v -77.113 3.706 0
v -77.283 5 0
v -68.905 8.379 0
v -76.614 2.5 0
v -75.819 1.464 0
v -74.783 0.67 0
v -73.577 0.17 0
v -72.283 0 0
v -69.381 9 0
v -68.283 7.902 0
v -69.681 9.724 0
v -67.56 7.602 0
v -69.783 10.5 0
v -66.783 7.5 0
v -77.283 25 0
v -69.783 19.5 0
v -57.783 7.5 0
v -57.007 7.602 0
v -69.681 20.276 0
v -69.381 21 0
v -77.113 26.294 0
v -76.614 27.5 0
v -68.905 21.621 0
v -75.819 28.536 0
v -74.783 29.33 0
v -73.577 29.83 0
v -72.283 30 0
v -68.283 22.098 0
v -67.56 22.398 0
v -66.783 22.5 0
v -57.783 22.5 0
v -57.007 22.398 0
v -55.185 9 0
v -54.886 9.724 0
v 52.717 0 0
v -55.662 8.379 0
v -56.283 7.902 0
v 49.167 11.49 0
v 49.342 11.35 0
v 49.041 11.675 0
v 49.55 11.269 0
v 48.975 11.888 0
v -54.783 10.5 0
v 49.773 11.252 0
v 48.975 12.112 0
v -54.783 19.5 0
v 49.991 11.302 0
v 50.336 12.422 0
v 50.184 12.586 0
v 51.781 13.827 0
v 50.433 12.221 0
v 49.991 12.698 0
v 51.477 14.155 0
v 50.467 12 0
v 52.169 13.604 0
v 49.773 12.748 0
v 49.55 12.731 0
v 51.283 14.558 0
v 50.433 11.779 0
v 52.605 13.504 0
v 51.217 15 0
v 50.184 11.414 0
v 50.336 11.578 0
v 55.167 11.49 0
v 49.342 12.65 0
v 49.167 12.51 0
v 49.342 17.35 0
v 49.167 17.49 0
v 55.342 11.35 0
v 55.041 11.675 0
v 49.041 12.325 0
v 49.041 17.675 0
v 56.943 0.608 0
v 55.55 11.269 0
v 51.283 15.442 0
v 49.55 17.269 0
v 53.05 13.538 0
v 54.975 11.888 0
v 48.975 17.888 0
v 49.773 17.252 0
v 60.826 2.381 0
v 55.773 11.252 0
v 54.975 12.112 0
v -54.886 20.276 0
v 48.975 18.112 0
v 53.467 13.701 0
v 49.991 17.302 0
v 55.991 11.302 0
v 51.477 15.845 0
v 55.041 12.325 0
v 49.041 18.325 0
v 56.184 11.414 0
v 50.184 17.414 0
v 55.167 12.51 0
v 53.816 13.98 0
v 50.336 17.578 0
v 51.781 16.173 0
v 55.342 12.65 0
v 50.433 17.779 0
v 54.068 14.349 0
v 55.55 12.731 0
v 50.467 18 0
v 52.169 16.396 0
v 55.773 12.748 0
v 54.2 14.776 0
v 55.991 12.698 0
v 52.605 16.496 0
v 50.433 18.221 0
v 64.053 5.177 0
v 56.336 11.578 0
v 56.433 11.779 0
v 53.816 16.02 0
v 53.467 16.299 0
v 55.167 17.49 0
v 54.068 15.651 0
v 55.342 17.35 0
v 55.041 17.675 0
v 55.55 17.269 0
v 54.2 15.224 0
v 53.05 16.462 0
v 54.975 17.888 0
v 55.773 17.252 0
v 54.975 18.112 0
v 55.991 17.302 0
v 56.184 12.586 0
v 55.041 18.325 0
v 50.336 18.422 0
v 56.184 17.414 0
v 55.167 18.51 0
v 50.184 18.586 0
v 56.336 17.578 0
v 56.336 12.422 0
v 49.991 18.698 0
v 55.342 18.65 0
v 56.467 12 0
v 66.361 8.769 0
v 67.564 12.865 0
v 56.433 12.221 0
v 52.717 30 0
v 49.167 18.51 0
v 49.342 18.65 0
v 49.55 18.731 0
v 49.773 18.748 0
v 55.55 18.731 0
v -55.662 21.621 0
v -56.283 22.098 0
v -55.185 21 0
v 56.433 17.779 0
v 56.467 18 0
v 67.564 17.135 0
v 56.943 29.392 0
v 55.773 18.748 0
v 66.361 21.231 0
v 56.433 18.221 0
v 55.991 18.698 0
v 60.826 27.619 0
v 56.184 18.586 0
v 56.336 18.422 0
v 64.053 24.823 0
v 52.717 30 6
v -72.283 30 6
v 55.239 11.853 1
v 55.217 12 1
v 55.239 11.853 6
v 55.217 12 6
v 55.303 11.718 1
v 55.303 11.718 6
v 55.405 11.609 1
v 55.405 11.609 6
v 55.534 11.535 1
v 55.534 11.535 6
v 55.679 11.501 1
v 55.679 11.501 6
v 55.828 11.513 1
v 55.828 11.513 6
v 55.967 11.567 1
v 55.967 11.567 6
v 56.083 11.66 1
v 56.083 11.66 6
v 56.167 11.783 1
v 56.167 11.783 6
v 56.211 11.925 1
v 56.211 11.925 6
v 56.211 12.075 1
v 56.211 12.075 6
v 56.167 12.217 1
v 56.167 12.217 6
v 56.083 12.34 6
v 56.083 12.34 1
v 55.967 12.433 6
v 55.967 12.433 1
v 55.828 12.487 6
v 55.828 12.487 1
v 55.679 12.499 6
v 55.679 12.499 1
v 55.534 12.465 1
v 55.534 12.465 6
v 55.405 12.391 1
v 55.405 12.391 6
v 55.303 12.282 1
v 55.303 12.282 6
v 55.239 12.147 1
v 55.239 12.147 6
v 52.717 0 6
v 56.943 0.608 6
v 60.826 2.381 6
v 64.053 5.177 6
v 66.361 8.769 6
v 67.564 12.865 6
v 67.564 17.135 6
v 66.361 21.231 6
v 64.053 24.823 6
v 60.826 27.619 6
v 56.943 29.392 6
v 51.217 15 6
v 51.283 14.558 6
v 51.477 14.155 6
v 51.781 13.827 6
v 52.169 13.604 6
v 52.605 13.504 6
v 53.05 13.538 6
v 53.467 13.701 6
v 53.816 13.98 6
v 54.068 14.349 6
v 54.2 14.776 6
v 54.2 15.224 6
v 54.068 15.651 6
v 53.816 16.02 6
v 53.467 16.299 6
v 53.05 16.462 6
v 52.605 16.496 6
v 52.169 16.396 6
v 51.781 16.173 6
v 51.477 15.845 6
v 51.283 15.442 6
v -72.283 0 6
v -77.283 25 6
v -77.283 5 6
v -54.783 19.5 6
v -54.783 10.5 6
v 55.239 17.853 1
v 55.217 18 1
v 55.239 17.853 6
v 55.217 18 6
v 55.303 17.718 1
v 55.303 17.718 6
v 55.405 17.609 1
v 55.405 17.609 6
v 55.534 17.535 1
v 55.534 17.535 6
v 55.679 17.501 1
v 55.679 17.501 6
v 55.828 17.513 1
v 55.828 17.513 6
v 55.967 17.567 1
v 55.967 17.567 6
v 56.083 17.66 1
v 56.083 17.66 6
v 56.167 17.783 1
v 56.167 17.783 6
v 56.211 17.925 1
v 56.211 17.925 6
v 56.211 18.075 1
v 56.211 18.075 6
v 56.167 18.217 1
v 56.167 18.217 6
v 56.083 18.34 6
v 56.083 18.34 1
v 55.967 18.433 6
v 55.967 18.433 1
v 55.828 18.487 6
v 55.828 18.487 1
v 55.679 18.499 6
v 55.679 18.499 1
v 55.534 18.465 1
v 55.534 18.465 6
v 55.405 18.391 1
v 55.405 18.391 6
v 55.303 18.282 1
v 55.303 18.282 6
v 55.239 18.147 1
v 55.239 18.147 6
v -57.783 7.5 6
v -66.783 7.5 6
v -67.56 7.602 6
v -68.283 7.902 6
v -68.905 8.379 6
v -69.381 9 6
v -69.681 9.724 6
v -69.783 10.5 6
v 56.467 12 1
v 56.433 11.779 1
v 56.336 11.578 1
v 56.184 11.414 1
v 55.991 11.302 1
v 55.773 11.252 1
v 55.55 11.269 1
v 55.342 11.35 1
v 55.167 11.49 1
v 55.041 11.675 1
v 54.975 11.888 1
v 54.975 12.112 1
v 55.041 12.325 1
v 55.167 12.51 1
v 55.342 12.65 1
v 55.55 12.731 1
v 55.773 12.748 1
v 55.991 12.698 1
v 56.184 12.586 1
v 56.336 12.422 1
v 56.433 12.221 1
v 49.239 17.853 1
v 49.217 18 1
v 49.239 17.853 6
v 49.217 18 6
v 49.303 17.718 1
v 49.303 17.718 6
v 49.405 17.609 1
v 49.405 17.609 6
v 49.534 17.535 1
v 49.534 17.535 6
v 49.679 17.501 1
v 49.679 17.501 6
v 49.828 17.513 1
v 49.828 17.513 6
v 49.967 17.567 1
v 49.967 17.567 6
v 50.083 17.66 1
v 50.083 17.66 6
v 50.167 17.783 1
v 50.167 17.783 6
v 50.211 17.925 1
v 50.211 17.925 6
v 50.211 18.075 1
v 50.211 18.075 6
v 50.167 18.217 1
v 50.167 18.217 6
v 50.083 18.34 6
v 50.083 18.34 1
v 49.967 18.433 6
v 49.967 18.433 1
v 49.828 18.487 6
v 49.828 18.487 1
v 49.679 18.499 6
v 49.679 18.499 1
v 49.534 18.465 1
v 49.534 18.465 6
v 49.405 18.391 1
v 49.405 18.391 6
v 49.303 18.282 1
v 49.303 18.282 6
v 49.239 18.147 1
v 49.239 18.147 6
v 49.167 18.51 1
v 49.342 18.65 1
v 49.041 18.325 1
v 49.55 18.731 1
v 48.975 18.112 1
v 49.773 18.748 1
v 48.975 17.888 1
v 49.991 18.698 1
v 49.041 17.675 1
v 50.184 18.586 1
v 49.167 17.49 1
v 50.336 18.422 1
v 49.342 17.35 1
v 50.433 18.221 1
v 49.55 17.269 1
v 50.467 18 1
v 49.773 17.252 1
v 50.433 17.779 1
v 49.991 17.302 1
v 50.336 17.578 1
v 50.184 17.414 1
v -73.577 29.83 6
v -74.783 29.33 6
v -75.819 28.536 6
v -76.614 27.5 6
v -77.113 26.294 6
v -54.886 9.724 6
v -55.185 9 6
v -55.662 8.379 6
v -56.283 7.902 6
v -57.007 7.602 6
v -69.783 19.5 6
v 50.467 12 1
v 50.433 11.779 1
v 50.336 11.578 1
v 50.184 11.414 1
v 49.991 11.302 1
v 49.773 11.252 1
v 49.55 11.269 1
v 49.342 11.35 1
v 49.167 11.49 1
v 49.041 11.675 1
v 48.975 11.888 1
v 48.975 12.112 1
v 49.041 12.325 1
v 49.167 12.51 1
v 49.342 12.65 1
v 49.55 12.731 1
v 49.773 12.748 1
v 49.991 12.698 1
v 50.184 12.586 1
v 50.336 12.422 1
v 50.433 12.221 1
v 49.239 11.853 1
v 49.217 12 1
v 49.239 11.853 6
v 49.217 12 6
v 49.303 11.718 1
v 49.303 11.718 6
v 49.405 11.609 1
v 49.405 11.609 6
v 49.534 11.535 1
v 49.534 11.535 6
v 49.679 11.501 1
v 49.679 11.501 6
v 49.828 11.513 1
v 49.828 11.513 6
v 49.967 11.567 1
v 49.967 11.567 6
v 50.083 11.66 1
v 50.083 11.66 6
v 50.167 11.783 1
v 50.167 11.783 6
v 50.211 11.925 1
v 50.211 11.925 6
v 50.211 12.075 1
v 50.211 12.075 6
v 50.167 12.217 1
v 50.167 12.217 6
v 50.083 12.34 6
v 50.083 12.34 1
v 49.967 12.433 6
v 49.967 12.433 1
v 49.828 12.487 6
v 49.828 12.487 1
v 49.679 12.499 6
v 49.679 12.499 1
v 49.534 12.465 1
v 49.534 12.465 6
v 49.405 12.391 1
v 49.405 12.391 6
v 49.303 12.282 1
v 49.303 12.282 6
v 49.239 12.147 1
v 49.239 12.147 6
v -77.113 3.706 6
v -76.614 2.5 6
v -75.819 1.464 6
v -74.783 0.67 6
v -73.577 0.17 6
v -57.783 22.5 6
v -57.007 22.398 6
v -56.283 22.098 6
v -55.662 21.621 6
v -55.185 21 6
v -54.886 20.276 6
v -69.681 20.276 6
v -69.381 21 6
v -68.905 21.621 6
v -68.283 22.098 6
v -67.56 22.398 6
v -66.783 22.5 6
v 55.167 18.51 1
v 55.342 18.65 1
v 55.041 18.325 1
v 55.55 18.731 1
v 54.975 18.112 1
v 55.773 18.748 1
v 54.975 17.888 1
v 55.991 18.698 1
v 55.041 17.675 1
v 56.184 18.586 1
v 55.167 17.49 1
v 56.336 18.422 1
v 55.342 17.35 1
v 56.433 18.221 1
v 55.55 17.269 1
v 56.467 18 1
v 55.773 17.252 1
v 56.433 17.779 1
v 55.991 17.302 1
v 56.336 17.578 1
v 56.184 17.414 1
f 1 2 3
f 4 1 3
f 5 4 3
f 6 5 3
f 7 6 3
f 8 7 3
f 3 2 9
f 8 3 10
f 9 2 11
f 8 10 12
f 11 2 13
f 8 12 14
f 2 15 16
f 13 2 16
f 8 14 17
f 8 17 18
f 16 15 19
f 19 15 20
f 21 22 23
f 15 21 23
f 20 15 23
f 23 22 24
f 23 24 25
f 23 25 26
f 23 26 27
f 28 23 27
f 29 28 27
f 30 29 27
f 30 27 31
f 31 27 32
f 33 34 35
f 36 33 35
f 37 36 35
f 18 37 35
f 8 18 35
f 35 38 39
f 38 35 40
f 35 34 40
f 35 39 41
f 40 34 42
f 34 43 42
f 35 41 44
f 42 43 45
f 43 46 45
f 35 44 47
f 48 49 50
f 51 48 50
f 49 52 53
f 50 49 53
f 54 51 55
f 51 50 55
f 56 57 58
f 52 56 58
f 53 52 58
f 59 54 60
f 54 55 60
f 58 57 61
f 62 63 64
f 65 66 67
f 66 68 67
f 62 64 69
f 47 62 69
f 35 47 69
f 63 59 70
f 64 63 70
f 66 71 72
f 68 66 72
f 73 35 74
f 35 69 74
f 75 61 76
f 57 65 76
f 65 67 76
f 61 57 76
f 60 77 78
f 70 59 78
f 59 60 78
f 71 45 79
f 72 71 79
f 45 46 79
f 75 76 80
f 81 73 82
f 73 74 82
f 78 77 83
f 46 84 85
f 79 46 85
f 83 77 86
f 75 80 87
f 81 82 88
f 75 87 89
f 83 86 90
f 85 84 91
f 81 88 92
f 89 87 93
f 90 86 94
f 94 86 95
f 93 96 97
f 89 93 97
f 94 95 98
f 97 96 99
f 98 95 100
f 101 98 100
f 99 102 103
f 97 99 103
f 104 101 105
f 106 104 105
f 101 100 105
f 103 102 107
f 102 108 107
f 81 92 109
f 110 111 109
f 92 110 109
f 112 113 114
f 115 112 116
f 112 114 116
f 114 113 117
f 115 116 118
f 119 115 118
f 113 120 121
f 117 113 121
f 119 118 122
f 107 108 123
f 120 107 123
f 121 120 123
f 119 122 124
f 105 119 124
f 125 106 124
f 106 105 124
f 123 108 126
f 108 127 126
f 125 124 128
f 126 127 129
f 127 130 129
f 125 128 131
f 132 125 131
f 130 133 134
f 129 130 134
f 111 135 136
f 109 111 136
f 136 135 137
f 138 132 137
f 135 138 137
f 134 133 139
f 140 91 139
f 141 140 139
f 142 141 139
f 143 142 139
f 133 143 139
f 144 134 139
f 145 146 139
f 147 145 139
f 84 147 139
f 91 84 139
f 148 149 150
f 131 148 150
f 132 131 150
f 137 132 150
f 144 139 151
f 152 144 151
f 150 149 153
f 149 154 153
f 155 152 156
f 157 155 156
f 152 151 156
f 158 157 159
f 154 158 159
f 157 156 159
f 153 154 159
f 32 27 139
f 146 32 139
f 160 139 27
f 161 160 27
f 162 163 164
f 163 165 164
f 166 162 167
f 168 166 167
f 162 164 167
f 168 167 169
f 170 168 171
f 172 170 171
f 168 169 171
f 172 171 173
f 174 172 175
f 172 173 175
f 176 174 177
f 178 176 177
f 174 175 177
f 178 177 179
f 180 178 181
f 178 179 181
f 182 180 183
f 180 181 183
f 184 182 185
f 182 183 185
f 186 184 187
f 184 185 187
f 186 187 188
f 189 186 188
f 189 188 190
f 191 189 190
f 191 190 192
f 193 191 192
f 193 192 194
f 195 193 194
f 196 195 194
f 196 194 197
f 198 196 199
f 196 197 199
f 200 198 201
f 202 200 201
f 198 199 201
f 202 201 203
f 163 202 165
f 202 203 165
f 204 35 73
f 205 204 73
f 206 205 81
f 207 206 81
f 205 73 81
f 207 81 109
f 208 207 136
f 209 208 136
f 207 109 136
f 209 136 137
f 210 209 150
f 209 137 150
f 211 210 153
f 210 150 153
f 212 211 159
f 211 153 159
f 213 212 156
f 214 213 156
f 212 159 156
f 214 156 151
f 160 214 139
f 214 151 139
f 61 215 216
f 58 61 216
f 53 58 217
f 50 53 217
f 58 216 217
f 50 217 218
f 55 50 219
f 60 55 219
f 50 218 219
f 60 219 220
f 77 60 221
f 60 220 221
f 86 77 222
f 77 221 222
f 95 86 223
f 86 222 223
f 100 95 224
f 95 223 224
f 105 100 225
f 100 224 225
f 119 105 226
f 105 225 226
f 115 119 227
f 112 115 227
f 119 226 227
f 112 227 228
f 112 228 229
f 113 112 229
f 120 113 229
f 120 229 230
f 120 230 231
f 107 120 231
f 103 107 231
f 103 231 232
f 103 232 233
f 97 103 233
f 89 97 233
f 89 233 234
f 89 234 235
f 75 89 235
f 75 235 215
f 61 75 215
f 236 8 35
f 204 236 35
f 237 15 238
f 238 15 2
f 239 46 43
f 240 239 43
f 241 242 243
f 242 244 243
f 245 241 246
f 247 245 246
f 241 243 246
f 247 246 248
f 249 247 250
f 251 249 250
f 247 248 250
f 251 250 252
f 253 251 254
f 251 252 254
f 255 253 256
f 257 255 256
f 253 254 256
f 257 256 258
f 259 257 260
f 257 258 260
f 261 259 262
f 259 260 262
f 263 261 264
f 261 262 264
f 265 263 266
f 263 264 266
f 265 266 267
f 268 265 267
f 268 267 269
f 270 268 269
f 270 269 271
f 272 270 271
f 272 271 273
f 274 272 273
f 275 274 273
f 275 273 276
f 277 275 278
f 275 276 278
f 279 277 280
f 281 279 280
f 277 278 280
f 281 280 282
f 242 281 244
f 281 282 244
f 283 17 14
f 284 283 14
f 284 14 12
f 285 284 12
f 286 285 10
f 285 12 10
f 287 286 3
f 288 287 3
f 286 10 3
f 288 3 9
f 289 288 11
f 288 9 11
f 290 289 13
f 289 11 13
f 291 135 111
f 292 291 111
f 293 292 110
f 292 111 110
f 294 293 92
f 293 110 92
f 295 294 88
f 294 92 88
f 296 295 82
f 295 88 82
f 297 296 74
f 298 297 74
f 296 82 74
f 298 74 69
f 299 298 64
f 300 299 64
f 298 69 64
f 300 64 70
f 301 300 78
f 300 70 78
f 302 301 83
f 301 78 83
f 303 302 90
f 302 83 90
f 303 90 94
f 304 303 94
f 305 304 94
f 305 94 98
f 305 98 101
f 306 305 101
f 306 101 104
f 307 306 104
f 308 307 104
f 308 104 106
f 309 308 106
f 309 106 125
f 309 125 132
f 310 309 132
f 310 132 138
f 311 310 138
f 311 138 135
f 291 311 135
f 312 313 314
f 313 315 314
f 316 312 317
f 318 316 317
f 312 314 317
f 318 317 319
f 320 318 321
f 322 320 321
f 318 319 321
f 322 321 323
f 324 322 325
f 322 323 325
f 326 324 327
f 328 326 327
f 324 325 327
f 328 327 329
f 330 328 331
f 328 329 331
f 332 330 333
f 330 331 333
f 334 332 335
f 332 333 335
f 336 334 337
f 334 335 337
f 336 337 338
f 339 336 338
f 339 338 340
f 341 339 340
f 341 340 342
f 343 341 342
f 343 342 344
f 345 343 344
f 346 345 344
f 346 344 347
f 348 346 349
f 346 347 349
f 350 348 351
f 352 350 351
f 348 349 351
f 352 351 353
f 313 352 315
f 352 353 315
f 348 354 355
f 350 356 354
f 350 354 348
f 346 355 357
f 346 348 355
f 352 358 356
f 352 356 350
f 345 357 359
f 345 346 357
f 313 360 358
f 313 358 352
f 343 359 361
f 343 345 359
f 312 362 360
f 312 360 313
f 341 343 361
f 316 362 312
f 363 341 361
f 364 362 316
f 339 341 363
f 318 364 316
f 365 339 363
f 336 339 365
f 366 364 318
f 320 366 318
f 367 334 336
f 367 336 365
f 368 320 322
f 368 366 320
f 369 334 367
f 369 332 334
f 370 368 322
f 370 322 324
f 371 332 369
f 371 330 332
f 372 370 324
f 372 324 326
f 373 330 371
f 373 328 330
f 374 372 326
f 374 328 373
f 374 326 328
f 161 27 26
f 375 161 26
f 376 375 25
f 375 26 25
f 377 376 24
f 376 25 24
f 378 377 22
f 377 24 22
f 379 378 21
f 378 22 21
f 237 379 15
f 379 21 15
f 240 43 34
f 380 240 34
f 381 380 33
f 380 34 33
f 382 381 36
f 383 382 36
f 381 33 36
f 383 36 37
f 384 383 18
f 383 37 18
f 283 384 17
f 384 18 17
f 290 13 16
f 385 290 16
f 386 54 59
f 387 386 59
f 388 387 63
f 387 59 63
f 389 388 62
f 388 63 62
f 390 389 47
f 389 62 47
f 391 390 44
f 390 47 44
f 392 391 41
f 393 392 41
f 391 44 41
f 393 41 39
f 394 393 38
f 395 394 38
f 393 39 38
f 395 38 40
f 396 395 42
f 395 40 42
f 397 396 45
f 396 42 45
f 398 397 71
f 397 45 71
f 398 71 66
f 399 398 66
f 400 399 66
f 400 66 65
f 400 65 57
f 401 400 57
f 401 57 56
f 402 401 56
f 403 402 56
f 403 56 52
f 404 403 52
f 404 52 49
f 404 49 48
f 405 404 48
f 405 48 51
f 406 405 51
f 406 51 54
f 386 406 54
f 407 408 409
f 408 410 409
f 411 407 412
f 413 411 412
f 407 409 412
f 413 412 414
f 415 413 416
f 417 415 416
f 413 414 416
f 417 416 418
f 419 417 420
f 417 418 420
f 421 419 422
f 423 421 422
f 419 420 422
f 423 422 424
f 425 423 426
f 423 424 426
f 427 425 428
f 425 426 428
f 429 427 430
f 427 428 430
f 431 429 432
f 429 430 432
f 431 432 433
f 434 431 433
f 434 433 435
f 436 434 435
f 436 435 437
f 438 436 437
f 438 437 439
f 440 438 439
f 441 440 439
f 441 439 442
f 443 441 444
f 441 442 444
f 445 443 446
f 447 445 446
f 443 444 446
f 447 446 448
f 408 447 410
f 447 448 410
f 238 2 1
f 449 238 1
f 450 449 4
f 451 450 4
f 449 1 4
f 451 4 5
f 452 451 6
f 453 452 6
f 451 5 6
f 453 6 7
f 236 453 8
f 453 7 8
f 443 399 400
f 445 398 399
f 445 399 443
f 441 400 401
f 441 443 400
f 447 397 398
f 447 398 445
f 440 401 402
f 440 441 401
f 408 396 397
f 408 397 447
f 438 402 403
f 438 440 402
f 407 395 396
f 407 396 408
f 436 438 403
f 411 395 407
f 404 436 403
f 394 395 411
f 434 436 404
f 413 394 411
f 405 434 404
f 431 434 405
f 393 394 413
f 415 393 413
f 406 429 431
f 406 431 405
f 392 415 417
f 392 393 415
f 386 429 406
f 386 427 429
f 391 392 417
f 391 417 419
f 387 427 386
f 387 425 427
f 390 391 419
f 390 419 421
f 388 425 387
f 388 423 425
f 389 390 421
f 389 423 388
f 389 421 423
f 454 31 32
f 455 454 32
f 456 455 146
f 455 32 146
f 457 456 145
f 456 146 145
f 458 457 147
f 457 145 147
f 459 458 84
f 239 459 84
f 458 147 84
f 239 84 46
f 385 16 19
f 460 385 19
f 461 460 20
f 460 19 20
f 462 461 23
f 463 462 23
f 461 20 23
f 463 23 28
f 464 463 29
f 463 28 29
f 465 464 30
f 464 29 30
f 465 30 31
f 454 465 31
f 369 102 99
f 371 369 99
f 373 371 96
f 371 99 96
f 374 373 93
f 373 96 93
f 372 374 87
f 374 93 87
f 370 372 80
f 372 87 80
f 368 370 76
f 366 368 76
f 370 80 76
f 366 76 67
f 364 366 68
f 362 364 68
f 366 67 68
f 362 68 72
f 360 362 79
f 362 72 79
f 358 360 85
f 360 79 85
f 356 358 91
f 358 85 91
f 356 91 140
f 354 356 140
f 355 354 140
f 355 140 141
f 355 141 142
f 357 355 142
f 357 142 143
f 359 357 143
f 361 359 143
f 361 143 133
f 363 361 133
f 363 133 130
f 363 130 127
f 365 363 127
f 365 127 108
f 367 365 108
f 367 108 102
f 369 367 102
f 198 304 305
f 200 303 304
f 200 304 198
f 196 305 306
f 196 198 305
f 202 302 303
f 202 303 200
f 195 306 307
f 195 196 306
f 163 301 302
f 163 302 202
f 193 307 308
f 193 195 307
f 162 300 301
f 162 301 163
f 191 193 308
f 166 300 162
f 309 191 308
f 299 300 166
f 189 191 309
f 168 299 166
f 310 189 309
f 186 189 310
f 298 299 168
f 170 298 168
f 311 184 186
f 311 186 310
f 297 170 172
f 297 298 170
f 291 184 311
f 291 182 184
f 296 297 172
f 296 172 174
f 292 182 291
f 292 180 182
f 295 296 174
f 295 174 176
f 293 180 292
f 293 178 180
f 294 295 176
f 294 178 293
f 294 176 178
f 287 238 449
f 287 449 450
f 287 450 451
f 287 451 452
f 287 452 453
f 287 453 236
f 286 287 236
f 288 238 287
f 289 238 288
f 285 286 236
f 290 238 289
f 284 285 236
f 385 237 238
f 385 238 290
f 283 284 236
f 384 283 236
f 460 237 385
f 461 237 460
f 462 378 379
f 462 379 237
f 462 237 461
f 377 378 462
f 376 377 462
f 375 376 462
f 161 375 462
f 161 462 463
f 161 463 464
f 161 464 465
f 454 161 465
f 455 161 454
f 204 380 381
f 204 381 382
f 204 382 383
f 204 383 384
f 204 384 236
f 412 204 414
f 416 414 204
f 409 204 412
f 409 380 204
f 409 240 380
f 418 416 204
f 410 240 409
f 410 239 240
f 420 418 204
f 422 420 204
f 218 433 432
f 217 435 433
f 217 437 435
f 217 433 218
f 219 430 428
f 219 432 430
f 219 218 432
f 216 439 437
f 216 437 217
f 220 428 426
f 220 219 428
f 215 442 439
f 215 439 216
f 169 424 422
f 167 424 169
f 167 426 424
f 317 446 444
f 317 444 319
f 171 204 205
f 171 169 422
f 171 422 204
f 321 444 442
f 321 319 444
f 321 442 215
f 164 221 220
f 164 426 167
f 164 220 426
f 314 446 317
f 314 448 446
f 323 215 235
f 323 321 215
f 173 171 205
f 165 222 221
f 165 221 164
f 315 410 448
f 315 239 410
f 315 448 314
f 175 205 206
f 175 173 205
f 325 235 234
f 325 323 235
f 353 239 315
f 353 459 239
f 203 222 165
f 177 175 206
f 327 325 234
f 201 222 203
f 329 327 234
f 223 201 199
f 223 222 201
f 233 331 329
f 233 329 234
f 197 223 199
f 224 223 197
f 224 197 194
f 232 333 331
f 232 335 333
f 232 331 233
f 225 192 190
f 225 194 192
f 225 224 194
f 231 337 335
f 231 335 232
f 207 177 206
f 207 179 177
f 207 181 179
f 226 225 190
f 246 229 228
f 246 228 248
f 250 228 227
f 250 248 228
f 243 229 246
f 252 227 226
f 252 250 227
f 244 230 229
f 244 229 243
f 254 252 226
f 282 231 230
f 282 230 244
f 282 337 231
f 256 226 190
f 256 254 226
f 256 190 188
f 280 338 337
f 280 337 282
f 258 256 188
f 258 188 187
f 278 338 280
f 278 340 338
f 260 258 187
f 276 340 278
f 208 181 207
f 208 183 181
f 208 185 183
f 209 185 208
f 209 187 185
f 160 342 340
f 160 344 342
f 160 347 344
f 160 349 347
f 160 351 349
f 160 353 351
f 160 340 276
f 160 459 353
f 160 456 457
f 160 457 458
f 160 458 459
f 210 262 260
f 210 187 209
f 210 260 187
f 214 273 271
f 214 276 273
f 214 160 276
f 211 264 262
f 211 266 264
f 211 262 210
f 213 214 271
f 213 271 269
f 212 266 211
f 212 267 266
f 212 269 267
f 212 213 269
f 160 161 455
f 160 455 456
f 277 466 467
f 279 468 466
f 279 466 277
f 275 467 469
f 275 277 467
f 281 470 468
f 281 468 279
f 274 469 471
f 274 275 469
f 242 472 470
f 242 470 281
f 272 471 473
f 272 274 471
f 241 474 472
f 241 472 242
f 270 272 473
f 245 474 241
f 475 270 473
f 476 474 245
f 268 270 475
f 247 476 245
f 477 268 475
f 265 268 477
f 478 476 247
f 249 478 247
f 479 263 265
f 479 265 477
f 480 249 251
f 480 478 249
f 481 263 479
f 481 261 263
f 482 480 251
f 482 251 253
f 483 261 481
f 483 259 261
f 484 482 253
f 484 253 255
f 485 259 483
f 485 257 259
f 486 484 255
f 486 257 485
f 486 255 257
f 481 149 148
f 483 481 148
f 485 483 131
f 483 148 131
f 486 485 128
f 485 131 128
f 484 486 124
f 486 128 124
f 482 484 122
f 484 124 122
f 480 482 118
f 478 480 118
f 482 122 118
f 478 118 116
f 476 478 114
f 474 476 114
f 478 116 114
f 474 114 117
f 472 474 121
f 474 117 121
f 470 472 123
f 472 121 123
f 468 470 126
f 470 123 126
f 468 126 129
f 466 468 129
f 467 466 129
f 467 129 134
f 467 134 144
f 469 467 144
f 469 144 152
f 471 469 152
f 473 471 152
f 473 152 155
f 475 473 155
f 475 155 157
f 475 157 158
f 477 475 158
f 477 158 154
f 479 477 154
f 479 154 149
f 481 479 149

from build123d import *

# Parameters (mm, degrees)
F1_DEPTH       = 6
F2_D           = 3
F3_D           = 1
F3_CBORE_D     = 1.5
F3_CBORE_DEPTH = 1


with BuildPart() as f1:
    # F0 (on Top) → F1 (new body)
    with BuildSketch(Plane.XY):
        with BuildLine():
            Line((52.7166165411, 30), (52.7166165411, 0))
            ThreePointArc((52.7166165411, 0), (67.7166165411, 15), (52.7166165411, 30))
        make_face()
        with BuildLine():
            Line((34.7231468186, 0), (52.7166165411, 0))
            ThreePointArc((52.7166165411, 0), (37.7166165411, 15), (52.7166165411, 30))
            Line((52.7166165411, 30), (35.3341475129, 30))
            Line((35.3341475129, 30), (-47.2833834589, 30))
            Line((-47.2833834589, 30), (-72.2833834589, 30))
            ThreePointArc((-72.2833834589, 30), (-75.8189173648, 28.5355339059), (-77.2833834589, 25))
            Line((-77.2833834589, 25), (-77.2833834589, 5))
            ThreePointArc((-77.2833834589, 5), (-75.8189173648, 1.4644660941), (-72.2833834589, 0))
            Line((-72.2833834589, 0), (16.729677096, 0))
            Line((16.729677096, 0), (34.7231468186, 0))
        make_face()
        with BuildLine():
            ThreePointArc((-69.7833834589, 19.5), (-68.9047038024, 21.6213203436), (-66.7833834589, 22.5))
            Line((-66.7833834589, 22.5), (-57.7833834589, 22.5))
            ThreePointArc((-57.7833834589, 22.5), (-55.6620631153, 21.6213203436), (-54.7833834589, 19.5))
            Line((-54.7833834589, 19.5), (-54.7833834589, 10.5))
            ThreePointArc((-54.7833834589, 10.5), (-55.6620631153, 8.3786796564), (-57.7833834589, 7.5))
            Line((-57.7833834589, 7.5), (-66.7833834589, 7.5))
            ThreePointArc((-66.7833834589, 7.5), (-68.9047038024, 8.3786796564), (-69.7833834589, 10.5))
            Line((-69.7833834589, 10.5), (-69.7833834589, 19.5))
        make_face(mode=Mode.SUBTRACT)
        with BuildLine():
            ThreePointArc((52.7166165411, 30), (37.7166165411, 15), (52.7166165411, 0))
            Line((52.7166165411, 0), (52.7166165411, 30))
        make_face()
    extrude(amount=F1_DEPTH)

    # F2 (through all)
    with Locations(Plane(origin=(0, 0, 0), x_dir=(1, 0, 0), z_dir=(0, 0, -1))):
        with Locations((52.7166165411, -15)):
            Hole(F2_D / 2)

    # F3 (through all)
    with Locations(Plane(origin=(0, 0, 0), x_dir=(1, 0, 0), z_dir=(0, 0, -1))):
        with Locations((55.7166165411, -18), (55.7166165411, -12), (49.7166165411, -12), (49.7166165411, -18)):
            CounterBoreHole(F3_D / 2, F3_CBORE_D / 2, F3_CBORE_DEPTH)


solid = f1.part
